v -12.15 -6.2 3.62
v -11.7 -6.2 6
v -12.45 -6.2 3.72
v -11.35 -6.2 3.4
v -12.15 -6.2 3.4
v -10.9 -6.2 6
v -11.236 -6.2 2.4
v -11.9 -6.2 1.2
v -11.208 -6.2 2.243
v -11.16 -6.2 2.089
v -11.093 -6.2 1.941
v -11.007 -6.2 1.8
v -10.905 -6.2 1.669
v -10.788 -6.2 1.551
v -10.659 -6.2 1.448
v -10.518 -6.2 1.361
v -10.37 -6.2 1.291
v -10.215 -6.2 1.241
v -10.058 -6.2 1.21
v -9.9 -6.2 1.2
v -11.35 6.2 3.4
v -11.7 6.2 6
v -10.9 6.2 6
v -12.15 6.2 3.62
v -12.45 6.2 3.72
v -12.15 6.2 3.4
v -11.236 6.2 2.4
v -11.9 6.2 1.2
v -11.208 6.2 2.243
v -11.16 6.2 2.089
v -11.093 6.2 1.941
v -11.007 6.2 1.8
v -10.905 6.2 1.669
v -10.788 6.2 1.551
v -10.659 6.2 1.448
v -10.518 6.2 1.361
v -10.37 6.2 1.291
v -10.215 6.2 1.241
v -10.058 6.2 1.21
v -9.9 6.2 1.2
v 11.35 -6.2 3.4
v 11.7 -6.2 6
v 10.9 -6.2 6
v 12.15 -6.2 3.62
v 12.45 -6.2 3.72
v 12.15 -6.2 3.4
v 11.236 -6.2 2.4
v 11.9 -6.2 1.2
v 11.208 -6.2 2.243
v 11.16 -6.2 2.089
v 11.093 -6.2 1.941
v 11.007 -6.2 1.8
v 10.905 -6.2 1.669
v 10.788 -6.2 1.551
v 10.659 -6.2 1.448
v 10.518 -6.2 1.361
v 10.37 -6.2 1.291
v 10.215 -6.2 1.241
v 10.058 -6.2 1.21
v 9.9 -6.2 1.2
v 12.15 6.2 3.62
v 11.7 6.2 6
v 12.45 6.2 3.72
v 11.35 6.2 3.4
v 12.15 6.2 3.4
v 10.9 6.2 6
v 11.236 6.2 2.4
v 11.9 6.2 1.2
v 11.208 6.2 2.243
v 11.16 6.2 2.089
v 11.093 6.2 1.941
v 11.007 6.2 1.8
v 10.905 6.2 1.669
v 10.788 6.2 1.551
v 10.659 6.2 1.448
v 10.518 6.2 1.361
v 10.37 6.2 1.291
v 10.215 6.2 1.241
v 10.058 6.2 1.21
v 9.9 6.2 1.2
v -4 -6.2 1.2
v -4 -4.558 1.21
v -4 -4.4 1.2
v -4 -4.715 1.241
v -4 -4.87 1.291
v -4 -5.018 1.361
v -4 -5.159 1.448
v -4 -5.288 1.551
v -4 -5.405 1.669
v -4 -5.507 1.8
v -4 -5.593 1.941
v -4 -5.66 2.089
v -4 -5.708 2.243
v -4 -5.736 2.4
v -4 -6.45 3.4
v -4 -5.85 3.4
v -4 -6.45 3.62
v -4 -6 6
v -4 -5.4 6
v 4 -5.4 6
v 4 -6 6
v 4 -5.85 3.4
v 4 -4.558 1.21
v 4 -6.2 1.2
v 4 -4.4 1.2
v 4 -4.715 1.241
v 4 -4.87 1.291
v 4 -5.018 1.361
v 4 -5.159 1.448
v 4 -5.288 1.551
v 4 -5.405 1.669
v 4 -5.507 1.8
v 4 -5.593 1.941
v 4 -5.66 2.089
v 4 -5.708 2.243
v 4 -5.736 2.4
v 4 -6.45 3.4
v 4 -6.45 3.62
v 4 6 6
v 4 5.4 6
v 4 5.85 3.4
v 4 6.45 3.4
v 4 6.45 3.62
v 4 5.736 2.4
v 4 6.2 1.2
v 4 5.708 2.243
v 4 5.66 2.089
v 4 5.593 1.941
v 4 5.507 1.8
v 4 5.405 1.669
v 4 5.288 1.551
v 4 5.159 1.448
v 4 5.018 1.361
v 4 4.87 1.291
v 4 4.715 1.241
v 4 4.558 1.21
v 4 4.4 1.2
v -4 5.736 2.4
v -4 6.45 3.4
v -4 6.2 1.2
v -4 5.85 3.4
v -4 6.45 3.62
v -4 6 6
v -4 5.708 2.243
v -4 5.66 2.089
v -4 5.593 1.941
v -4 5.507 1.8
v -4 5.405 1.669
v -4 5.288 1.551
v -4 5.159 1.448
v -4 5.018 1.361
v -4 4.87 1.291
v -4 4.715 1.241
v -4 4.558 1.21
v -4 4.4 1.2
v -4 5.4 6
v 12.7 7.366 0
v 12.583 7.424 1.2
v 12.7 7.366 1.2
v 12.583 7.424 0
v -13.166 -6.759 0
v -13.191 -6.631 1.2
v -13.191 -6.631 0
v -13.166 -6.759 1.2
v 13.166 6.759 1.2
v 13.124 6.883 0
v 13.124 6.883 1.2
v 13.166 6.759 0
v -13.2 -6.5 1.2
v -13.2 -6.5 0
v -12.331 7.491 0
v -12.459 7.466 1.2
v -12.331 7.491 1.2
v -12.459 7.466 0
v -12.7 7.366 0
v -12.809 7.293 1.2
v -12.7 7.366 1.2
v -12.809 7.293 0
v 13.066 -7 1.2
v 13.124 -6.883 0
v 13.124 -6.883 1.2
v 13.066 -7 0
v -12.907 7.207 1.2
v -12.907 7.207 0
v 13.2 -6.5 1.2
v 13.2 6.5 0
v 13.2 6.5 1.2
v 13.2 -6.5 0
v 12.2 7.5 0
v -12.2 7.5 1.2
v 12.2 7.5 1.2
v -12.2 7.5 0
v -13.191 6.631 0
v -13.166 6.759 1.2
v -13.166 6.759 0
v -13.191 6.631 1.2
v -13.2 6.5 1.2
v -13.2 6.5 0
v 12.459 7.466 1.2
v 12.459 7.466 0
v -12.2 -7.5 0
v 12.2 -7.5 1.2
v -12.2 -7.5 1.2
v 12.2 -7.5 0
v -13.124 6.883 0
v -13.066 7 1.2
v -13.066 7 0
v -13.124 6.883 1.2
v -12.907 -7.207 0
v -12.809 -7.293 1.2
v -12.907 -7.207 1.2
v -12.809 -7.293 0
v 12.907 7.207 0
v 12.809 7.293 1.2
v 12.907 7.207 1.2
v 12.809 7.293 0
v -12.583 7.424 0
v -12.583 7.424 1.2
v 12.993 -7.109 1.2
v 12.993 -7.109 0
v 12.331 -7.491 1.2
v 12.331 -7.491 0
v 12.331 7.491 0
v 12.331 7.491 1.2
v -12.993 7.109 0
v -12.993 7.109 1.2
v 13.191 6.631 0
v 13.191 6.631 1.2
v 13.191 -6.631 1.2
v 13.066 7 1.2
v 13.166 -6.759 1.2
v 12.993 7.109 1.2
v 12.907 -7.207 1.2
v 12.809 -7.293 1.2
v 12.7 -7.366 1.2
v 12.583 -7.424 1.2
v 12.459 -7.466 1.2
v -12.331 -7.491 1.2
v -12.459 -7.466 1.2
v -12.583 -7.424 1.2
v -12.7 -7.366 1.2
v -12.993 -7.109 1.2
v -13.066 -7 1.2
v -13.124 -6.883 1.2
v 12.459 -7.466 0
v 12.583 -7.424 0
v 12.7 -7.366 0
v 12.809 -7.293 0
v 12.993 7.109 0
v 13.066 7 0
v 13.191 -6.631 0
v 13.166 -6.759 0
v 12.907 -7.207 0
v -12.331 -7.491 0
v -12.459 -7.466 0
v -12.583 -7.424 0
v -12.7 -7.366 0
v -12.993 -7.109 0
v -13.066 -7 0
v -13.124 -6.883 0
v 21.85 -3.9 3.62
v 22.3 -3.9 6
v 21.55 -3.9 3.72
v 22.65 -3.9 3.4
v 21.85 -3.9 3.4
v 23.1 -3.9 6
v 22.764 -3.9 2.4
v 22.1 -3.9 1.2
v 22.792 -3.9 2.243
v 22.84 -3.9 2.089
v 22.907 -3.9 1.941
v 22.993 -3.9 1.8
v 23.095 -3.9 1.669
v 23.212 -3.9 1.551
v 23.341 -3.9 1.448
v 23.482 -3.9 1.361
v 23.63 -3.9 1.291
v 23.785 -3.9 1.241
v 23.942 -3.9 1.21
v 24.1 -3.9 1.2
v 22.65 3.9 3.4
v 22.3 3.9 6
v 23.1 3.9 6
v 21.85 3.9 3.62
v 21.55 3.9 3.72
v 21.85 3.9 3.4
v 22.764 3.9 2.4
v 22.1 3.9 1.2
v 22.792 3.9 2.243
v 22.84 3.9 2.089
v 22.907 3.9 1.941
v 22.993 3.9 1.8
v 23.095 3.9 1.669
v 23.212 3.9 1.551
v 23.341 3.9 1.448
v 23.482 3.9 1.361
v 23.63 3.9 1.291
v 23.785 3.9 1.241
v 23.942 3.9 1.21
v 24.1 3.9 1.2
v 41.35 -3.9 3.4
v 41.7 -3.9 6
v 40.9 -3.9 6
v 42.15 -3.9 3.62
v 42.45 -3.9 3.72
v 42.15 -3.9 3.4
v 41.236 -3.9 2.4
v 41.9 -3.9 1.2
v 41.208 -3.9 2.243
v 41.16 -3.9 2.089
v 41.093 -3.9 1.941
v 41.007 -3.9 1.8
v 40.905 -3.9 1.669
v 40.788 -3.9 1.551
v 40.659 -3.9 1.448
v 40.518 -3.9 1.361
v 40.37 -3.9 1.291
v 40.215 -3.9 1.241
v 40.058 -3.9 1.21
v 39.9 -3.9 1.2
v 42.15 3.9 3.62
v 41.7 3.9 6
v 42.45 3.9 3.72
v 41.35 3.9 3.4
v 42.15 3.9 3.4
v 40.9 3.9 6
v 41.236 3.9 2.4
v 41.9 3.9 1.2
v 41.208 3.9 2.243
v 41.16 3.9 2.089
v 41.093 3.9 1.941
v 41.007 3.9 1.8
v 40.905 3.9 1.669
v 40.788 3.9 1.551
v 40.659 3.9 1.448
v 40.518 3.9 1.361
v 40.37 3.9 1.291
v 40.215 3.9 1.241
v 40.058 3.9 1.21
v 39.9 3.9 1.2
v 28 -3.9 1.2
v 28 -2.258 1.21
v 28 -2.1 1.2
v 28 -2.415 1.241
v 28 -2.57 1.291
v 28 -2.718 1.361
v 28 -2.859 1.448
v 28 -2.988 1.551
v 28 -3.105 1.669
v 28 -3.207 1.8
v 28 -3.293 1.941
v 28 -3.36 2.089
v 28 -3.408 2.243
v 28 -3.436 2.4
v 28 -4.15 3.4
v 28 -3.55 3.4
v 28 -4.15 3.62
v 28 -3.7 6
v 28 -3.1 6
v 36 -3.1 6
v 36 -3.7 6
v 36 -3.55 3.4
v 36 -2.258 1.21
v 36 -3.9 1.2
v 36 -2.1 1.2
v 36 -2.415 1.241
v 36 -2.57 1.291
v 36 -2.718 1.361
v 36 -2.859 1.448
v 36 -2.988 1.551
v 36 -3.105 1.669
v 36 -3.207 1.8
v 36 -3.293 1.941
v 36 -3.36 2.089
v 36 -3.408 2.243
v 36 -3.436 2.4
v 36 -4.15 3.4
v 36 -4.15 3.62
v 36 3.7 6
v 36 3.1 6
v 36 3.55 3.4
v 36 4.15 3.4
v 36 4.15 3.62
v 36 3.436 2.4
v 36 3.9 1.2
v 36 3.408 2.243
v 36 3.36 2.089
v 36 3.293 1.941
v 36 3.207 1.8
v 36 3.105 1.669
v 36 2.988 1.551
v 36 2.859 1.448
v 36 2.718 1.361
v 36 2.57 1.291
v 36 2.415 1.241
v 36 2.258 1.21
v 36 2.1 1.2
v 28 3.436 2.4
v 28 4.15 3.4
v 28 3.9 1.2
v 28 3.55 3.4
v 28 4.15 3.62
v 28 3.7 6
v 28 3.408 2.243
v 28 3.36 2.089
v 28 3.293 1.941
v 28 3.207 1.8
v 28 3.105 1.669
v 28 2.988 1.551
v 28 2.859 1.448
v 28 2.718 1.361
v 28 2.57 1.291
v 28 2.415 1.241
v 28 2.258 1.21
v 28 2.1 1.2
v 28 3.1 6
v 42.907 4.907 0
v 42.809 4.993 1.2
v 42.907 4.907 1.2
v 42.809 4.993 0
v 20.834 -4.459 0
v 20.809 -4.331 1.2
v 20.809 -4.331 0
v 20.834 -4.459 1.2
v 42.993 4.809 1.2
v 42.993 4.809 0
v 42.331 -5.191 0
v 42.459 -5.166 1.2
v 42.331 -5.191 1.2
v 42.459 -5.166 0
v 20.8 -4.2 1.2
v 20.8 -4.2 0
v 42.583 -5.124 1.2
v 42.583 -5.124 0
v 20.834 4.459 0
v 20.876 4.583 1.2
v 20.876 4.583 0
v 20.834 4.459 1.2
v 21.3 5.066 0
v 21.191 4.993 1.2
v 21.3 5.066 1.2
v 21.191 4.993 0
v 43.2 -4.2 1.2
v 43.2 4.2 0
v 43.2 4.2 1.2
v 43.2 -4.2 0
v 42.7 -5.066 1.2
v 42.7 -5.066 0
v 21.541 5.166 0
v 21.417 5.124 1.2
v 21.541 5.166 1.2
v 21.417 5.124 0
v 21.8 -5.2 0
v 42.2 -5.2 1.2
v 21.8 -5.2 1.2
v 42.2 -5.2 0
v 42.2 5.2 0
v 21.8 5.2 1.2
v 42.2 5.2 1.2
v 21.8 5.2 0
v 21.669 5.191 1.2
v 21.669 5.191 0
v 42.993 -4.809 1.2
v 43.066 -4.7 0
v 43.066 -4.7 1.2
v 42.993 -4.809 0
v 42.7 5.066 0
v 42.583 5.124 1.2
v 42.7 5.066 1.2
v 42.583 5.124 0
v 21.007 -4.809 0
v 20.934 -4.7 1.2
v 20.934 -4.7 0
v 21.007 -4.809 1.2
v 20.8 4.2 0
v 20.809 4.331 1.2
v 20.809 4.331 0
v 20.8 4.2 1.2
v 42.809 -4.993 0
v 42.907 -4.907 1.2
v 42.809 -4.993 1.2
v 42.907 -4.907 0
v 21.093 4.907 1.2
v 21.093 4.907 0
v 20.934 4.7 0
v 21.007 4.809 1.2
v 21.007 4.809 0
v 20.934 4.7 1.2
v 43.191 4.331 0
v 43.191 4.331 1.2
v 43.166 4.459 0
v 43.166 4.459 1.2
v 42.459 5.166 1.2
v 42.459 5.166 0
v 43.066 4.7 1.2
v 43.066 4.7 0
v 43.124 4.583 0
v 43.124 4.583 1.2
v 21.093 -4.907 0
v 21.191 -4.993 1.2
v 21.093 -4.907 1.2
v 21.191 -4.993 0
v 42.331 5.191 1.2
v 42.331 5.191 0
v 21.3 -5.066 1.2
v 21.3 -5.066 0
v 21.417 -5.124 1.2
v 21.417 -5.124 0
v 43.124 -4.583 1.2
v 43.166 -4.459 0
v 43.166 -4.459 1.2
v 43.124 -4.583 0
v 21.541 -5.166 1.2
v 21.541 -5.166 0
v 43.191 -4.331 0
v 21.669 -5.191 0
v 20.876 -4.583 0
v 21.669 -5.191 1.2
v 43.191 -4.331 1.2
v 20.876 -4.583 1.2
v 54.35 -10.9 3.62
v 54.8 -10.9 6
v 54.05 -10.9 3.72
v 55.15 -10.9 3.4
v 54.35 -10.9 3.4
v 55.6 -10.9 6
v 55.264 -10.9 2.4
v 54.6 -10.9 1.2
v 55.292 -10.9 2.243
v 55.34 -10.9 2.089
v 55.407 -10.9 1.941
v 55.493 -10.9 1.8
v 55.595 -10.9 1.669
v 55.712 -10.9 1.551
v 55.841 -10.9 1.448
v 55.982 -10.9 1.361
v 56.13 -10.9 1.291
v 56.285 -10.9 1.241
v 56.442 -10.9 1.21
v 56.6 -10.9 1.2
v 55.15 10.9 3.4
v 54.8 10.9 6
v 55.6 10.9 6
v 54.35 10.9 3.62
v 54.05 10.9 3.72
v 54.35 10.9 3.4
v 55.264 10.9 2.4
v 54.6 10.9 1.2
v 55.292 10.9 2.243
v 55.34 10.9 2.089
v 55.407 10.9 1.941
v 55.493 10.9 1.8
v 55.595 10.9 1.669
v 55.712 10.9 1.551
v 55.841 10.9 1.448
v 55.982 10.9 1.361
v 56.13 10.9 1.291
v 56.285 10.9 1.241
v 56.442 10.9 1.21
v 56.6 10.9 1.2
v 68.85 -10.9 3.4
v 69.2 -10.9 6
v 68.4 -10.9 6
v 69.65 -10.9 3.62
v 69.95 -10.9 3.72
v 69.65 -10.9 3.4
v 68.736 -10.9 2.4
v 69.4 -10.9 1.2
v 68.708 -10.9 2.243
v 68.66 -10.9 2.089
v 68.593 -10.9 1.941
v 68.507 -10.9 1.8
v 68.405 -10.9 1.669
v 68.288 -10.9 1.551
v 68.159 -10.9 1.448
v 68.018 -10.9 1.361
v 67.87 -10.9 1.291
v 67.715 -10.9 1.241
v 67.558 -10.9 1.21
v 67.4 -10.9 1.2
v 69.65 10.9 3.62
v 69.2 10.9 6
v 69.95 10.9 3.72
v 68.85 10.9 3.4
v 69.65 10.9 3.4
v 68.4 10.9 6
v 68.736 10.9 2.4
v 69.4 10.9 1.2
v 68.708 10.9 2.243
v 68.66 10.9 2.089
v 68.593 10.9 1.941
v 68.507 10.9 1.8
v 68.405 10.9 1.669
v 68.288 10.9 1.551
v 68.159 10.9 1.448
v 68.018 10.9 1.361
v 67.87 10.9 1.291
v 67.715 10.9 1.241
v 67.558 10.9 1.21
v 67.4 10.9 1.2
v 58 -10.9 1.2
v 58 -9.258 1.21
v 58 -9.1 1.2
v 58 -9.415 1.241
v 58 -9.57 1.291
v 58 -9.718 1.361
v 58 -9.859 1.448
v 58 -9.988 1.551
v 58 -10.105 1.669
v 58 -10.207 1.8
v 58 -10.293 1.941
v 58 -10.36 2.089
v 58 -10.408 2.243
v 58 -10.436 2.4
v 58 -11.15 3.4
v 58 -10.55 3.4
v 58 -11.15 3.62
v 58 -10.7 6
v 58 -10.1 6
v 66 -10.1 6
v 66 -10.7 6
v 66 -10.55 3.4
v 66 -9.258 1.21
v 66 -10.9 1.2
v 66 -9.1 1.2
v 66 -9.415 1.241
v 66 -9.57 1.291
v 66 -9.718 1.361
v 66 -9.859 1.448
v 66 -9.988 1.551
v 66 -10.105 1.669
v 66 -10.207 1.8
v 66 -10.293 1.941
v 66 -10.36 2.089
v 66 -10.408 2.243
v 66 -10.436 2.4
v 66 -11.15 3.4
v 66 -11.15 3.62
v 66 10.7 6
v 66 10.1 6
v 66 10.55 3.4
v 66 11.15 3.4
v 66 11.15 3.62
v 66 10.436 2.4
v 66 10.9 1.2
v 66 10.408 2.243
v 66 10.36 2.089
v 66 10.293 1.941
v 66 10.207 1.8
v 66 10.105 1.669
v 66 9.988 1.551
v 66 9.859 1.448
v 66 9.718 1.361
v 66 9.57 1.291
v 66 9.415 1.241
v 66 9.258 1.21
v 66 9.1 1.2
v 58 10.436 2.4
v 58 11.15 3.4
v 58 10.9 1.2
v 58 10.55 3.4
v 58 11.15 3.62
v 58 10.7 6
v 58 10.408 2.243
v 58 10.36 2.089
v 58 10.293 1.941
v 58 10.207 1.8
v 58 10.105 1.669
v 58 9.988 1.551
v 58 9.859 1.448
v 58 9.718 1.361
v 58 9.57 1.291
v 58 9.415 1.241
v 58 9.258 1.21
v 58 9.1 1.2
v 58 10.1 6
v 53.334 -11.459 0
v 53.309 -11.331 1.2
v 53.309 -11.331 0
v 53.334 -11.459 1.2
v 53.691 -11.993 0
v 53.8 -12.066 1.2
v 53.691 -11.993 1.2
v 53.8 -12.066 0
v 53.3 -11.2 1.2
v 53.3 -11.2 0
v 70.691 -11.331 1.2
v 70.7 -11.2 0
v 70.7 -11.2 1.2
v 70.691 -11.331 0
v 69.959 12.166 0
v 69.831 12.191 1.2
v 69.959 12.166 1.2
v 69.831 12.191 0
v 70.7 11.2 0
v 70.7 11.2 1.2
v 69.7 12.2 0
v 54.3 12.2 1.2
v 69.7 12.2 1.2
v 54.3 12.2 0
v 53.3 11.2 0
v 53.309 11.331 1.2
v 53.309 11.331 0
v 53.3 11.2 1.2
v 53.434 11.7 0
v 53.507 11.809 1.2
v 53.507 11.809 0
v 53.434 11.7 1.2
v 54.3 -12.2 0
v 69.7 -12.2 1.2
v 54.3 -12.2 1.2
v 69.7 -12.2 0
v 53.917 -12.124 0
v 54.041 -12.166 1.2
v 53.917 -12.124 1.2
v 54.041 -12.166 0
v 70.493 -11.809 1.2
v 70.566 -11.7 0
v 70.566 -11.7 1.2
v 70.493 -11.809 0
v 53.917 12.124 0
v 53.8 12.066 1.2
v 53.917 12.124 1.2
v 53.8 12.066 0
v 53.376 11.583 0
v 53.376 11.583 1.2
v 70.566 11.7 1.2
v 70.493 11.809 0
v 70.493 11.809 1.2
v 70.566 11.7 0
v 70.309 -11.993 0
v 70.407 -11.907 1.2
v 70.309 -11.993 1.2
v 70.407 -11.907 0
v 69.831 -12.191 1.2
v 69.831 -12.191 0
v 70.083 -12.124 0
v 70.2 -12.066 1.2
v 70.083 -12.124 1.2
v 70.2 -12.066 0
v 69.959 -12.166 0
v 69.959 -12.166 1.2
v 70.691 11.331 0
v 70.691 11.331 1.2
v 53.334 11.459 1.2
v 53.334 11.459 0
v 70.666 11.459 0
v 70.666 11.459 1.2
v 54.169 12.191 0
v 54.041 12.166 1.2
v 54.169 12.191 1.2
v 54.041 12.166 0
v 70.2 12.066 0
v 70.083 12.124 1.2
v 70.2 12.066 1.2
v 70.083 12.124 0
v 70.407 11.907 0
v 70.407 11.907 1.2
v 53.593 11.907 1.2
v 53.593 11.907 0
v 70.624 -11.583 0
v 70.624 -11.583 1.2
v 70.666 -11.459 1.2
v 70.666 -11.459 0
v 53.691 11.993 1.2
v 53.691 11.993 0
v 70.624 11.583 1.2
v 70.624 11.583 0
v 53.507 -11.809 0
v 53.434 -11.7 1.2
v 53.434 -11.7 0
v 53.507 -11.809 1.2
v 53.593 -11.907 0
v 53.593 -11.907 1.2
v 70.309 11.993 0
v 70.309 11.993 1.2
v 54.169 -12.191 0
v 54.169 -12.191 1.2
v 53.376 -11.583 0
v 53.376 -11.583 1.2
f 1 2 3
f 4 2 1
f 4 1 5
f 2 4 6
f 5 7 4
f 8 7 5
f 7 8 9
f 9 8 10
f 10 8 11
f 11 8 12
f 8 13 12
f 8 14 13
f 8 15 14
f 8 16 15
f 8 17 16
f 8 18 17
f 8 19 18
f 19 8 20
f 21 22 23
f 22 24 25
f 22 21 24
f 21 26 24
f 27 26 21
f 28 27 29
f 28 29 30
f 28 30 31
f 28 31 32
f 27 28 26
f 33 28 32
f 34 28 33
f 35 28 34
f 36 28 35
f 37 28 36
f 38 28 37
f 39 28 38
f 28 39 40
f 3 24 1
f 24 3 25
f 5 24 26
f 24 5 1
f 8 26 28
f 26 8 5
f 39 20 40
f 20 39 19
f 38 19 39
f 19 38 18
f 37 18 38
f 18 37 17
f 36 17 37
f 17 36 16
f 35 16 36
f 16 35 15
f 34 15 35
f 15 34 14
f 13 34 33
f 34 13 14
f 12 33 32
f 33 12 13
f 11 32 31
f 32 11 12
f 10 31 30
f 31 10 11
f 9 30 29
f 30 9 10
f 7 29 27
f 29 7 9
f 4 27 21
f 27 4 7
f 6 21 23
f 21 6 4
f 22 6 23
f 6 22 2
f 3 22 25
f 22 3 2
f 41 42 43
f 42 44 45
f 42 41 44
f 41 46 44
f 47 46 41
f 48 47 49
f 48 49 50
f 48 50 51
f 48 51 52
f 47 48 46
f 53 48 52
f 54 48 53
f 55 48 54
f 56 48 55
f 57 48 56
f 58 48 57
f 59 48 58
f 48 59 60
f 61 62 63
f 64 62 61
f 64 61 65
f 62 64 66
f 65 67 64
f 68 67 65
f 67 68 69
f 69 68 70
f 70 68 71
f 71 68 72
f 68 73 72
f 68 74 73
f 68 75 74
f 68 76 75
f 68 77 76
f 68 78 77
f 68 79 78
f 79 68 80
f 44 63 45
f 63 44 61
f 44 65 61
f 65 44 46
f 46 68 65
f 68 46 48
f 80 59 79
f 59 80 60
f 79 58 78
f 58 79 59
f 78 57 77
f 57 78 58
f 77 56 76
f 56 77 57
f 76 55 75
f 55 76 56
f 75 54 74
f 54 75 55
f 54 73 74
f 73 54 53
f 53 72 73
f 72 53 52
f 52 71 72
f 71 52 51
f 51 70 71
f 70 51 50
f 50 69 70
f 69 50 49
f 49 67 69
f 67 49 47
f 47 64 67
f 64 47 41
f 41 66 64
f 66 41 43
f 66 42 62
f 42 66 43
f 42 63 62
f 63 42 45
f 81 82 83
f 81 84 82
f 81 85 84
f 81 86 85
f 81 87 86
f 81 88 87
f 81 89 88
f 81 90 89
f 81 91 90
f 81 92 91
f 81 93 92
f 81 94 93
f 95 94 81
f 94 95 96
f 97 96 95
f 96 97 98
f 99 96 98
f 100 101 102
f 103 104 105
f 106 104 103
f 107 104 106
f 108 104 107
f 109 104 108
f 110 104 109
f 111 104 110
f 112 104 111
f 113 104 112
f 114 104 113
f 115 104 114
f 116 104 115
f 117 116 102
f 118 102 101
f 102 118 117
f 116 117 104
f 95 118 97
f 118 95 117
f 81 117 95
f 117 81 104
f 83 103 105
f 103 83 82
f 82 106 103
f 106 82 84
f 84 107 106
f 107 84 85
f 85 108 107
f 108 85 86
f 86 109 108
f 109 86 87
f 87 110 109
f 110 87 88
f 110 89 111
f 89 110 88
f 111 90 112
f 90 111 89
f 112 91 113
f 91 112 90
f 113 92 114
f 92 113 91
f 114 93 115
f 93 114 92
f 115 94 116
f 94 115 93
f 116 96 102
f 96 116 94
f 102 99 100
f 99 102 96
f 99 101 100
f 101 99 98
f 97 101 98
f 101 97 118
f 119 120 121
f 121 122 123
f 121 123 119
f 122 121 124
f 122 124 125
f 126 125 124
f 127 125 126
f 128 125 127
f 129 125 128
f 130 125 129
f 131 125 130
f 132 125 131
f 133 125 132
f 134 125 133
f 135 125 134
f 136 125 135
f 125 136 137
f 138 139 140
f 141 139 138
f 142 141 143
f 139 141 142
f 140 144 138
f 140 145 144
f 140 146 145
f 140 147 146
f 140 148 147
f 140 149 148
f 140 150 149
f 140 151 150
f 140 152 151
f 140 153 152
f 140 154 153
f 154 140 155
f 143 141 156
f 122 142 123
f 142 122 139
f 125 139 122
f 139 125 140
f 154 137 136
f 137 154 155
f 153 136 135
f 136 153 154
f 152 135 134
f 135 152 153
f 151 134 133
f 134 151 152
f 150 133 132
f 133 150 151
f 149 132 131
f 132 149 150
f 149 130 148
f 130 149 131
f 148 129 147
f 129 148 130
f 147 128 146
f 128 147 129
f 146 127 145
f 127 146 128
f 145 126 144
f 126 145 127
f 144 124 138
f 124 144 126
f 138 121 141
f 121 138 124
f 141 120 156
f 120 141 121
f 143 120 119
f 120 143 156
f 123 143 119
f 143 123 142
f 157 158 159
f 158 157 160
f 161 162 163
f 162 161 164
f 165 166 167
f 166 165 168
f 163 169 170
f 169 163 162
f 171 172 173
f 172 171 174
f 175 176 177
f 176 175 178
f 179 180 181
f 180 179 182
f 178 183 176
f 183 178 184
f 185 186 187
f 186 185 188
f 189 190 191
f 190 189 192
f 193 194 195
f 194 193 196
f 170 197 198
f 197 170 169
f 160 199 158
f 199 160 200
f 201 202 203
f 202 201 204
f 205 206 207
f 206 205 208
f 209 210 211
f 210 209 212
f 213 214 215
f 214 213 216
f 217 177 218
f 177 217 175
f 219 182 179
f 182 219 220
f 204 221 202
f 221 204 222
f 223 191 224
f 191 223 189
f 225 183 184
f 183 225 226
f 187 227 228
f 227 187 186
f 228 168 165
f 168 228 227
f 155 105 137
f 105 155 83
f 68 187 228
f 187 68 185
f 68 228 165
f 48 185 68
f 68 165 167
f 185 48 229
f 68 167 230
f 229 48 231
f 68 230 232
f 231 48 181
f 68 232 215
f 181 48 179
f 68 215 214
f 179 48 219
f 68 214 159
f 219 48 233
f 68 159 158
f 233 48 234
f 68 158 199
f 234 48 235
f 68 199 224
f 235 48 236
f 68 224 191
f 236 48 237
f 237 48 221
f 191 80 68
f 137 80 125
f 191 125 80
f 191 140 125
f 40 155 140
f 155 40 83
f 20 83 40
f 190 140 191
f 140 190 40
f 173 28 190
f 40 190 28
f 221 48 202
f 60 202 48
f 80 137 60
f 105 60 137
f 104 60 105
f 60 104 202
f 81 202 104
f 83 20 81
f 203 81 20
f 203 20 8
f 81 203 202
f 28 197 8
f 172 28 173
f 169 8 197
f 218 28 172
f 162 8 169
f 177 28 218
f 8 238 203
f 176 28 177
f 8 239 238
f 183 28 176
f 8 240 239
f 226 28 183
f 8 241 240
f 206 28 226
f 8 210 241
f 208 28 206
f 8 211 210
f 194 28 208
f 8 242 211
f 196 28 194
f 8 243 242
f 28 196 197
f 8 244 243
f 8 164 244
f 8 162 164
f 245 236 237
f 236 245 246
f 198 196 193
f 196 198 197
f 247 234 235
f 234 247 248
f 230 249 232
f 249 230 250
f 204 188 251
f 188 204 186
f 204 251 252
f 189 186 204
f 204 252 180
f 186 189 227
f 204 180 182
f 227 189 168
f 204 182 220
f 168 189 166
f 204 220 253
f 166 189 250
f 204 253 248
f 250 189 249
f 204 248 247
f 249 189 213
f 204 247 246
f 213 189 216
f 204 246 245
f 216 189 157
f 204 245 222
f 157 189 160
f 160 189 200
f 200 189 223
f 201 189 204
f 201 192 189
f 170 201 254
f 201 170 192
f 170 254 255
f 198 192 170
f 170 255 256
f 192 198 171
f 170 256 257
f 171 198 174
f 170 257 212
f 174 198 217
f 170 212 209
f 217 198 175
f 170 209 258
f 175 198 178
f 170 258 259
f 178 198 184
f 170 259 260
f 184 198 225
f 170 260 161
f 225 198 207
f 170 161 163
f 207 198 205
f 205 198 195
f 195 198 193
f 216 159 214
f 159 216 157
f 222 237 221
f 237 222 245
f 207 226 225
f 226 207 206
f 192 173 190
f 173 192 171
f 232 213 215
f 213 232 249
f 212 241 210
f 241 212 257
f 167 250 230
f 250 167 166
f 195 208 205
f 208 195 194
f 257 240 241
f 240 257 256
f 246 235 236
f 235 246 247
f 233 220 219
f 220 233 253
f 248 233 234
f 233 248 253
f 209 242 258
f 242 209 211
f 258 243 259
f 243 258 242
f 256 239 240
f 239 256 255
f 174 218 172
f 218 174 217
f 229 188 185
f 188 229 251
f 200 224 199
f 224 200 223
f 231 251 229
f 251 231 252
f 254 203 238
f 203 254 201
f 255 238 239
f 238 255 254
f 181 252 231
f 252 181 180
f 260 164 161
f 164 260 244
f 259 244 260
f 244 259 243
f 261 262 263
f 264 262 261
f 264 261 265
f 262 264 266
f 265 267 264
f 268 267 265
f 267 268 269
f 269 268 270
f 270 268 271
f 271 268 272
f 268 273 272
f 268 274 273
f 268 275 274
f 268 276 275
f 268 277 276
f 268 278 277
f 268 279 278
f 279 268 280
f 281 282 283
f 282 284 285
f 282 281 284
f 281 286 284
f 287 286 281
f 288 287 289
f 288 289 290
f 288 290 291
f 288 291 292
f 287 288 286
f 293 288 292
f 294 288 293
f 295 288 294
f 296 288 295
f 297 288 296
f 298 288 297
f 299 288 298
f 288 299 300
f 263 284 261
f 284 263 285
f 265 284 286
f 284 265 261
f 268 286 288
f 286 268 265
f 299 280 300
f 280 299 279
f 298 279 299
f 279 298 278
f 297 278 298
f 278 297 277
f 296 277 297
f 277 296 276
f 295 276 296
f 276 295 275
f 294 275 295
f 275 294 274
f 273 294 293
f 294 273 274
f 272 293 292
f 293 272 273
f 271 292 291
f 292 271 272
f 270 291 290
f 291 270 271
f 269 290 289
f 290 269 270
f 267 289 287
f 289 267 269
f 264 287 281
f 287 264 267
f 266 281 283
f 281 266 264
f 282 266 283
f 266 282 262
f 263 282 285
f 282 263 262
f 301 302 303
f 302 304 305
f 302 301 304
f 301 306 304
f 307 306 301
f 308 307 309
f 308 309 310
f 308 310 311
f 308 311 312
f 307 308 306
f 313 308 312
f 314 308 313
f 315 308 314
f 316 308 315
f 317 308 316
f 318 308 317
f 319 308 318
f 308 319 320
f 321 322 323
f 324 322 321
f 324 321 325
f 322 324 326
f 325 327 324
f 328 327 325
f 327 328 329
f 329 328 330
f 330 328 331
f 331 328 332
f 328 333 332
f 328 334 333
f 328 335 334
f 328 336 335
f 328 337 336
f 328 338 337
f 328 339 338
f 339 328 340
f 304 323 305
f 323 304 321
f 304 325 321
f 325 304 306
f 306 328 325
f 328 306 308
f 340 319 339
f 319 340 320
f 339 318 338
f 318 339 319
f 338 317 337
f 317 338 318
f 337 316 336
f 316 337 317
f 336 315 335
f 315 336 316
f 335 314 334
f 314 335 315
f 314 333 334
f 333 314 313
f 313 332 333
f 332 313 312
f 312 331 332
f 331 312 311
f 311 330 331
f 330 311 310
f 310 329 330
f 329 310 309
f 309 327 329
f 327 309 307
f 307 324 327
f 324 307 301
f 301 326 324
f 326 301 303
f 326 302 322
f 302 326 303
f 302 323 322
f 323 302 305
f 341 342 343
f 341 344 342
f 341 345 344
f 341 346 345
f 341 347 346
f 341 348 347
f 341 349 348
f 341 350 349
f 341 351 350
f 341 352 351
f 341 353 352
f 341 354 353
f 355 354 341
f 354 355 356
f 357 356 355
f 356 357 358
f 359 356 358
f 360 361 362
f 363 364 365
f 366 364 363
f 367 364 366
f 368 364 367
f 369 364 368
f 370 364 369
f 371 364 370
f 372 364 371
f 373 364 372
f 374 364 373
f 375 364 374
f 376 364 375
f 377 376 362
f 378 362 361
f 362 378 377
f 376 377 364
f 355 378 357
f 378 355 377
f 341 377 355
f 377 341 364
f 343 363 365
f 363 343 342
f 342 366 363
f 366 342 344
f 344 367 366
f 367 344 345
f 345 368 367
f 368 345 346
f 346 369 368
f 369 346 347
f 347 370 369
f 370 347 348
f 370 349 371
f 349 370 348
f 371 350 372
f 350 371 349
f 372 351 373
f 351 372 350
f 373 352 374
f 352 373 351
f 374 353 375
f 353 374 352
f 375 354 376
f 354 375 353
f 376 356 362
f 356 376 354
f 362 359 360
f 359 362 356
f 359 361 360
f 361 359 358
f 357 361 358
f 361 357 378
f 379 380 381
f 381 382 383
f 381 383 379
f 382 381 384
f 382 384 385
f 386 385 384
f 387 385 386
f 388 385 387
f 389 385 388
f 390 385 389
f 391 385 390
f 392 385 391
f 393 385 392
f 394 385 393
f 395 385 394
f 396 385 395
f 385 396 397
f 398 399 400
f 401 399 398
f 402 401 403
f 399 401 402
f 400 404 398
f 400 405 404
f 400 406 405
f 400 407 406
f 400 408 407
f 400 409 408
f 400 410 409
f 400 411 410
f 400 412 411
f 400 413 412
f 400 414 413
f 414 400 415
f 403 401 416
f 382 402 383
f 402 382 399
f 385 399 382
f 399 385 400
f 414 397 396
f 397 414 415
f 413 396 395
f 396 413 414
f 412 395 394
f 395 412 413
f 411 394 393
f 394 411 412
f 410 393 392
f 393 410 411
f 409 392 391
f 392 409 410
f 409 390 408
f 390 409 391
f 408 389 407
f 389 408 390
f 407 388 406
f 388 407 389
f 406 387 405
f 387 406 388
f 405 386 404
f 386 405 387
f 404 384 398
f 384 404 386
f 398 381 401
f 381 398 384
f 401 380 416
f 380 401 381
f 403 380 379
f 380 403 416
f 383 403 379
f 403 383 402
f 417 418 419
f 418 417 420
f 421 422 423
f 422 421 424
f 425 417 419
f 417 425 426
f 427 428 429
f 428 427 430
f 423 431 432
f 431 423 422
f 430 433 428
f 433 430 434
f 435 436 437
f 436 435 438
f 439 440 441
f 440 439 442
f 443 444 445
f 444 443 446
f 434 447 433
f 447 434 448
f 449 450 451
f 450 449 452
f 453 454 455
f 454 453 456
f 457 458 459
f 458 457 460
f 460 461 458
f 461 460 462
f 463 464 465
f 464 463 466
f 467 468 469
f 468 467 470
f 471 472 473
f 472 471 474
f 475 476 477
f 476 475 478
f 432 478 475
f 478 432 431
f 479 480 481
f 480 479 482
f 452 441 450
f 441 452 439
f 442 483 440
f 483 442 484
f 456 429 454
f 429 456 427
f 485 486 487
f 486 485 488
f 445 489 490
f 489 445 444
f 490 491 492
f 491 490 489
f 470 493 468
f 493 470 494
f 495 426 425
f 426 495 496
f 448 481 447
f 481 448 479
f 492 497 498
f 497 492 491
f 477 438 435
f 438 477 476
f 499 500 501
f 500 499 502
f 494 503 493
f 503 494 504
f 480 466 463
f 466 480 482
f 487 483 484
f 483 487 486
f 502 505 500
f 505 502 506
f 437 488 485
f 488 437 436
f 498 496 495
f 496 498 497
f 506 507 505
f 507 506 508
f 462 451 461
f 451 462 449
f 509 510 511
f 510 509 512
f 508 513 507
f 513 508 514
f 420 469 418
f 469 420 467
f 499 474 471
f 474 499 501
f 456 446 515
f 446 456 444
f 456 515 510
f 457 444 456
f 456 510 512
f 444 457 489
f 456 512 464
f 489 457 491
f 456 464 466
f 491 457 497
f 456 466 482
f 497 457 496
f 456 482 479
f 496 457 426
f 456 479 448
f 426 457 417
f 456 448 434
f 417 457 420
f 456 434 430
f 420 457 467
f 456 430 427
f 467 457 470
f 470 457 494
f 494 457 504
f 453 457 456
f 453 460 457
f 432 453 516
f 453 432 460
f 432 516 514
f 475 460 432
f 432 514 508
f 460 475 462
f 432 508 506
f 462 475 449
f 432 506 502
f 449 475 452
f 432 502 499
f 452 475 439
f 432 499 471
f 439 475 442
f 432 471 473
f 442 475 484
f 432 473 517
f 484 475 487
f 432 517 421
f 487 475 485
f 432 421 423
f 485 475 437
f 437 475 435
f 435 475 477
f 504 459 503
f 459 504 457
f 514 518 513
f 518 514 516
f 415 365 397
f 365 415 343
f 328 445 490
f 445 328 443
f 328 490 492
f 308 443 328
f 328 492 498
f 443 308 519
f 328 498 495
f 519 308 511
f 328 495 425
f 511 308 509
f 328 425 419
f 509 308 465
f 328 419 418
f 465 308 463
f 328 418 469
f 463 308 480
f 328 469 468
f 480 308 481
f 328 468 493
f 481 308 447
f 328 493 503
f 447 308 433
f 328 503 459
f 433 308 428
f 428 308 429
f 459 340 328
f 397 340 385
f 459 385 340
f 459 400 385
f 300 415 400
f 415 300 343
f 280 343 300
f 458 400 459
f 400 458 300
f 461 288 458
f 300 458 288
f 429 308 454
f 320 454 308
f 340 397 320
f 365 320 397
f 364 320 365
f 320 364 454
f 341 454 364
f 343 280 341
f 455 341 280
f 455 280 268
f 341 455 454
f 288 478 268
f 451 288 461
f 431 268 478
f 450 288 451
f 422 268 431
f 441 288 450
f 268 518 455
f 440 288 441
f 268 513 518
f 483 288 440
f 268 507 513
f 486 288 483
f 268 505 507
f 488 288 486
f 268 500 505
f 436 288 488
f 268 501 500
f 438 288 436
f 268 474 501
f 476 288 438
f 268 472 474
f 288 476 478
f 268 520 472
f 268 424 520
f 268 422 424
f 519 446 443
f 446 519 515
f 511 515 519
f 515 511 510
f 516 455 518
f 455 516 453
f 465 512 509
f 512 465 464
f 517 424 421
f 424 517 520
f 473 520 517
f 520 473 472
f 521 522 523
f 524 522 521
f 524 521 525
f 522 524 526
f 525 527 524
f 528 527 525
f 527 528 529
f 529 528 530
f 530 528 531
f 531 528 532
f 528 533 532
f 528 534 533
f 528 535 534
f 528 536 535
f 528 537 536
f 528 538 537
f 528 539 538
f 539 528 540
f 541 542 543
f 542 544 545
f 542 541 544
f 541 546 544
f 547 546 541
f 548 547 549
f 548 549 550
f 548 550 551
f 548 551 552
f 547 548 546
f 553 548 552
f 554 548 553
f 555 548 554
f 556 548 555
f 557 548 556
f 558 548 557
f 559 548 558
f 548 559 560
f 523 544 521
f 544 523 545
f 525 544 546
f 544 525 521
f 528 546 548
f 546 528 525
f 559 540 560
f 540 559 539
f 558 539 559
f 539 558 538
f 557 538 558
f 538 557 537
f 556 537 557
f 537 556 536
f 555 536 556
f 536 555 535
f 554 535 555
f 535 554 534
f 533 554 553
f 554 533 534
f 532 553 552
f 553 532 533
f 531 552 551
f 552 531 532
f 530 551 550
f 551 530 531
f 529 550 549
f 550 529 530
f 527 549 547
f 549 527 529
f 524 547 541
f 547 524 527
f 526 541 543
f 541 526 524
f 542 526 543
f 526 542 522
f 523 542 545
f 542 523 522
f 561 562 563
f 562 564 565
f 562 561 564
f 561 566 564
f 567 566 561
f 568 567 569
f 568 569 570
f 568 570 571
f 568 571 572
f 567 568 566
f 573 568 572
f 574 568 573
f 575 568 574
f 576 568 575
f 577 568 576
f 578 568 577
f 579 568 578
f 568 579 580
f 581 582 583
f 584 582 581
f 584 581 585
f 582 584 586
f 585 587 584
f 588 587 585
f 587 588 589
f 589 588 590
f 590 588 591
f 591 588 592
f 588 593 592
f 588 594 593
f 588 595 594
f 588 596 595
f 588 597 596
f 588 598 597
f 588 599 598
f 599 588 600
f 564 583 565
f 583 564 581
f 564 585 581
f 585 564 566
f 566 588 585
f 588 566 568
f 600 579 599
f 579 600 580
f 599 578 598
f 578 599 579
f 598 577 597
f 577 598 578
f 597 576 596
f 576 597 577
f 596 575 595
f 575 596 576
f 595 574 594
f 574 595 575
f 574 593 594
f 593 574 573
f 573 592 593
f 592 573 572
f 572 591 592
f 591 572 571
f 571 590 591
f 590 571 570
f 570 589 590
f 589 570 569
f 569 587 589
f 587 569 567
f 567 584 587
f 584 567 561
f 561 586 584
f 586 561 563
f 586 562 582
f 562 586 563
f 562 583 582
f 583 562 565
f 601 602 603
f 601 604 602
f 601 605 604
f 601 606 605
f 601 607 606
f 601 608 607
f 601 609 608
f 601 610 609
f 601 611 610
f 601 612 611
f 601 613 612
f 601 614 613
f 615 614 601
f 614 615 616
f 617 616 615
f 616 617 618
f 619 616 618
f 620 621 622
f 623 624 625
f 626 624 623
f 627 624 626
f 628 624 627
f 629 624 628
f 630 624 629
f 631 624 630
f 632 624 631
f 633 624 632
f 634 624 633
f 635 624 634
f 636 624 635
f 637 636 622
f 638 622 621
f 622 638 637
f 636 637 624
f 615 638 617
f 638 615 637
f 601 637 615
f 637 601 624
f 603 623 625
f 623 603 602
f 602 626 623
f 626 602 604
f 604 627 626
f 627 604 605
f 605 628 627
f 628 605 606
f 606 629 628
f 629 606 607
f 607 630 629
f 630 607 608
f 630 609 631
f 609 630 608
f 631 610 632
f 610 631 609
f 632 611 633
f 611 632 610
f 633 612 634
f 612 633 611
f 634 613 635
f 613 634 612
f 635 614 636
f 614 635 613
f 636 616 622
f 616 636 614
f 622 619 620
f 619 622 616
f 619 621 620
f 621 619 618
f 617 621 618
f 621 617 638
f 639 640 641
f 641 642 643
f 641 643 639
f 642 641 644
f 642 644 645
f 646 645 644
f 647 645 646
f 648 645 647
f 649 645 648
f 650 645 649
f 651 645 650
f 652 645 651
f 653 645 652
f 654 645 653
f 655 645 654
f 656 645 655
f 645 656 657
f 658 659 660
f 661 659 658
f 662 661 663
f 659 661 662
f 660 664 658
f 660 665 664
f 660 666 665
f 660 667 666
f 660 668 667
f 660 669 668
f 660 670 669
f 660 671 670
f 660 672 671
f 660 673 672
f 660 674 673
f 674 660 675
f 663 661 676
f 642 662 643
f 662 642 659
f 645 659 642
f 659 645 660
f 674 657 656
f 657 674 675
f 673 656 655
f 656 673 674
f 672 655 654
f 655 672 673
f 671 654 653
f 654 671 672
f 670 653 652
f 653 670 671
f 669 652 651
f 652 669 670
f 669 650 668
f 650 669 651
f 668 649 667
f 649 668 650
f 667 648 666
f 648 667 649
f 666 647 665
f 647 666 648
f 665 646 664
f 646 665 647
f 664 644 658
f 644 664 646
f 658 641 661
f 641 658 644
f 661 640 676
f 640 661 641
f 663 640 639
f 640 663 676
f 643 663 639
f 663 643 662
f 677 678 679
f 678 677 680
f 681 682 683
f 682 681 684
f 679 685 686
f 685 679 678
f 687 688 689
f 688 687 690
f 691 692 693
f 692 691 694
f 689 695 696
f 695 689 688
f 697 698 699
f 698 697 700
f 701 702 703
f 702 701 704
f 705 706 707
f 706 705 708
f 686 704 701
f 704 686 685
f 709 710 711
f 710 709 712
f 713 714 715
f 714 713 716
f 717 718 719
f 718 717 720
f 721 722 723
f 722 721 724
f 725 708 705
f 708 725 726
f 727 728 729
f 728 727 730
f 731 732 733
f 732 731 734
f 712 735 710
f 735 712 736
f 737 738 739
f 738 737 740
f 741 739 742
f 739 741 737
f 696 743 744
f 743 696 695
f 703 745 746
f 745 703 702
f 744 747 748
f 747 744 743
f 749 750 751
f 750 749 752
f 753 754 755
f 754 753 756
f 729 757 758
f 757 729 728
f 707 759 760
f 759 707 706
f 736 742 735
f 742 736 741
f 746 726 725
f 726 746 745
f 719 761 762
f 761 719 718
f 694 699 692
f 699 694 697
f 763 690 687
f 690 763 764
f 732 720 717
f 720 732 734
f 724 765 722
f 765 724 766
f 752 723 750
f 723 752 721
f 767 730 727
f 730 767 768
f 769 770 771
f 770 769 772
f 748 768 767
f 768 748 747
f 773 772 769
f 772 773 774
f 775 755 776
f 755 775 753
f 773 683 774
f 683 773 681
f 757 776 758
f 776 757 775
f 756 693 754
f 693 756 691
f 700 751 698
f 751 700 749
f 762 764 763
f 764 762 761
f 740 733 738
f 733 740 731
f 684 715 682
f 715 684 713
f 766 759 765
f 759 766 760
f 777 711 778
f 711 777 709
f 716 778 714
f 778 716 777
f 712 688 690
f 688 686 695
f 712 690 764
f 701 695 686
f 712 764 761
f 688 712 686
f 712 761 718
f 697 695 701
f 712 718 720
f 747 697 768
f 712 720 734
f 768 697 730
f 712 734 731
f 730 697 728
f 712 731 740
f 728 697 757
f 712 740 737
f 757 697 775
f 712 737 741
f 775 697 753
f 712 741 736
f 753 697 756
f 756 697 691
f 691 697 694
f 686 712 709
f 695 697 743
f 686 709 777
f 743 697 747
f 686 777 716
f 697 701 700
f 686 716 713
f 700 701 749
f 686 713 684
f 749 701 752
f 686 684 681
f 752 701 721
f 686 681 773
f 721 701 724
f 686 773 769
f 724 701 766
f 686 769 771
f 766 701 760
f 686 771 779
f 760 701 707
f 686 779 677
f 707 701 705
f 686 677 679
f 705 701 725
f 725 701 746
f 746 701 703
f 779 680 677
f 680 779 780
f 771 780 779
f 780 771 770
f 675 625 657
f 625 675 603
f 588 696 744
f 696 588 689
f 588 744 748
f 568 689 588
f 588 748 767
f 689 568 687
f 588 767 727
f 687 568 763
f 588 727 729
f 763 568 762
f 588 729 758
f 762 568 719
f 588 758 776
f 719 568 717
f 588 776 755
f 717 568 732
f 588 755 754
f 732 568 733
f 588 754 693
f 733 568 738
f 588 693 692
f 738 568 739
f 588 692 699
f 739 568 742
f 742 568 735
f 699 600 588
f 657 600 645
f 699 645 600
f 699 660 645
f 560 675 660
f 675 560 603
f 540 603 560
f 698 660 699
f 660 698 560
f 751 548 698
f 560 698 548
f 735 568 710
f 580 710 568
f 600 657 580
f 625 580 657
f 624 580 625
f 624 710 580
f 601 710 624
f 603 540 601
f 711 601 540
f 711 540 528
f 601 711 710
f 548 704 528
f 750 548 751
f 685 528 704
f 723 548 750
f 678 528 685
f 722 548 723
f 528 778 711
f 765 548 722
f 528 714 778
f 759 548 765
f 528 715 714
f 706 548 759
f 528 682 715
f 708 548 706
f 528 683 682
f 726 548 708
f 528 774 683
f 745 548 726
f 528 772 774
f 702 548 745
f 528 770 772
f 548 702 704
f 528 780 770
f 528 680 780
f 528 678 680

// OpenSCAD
// Matching HDMI, SD and USB covers, in print orientation.
use <../src/router_heltec_case.scad>
covers_scene();
